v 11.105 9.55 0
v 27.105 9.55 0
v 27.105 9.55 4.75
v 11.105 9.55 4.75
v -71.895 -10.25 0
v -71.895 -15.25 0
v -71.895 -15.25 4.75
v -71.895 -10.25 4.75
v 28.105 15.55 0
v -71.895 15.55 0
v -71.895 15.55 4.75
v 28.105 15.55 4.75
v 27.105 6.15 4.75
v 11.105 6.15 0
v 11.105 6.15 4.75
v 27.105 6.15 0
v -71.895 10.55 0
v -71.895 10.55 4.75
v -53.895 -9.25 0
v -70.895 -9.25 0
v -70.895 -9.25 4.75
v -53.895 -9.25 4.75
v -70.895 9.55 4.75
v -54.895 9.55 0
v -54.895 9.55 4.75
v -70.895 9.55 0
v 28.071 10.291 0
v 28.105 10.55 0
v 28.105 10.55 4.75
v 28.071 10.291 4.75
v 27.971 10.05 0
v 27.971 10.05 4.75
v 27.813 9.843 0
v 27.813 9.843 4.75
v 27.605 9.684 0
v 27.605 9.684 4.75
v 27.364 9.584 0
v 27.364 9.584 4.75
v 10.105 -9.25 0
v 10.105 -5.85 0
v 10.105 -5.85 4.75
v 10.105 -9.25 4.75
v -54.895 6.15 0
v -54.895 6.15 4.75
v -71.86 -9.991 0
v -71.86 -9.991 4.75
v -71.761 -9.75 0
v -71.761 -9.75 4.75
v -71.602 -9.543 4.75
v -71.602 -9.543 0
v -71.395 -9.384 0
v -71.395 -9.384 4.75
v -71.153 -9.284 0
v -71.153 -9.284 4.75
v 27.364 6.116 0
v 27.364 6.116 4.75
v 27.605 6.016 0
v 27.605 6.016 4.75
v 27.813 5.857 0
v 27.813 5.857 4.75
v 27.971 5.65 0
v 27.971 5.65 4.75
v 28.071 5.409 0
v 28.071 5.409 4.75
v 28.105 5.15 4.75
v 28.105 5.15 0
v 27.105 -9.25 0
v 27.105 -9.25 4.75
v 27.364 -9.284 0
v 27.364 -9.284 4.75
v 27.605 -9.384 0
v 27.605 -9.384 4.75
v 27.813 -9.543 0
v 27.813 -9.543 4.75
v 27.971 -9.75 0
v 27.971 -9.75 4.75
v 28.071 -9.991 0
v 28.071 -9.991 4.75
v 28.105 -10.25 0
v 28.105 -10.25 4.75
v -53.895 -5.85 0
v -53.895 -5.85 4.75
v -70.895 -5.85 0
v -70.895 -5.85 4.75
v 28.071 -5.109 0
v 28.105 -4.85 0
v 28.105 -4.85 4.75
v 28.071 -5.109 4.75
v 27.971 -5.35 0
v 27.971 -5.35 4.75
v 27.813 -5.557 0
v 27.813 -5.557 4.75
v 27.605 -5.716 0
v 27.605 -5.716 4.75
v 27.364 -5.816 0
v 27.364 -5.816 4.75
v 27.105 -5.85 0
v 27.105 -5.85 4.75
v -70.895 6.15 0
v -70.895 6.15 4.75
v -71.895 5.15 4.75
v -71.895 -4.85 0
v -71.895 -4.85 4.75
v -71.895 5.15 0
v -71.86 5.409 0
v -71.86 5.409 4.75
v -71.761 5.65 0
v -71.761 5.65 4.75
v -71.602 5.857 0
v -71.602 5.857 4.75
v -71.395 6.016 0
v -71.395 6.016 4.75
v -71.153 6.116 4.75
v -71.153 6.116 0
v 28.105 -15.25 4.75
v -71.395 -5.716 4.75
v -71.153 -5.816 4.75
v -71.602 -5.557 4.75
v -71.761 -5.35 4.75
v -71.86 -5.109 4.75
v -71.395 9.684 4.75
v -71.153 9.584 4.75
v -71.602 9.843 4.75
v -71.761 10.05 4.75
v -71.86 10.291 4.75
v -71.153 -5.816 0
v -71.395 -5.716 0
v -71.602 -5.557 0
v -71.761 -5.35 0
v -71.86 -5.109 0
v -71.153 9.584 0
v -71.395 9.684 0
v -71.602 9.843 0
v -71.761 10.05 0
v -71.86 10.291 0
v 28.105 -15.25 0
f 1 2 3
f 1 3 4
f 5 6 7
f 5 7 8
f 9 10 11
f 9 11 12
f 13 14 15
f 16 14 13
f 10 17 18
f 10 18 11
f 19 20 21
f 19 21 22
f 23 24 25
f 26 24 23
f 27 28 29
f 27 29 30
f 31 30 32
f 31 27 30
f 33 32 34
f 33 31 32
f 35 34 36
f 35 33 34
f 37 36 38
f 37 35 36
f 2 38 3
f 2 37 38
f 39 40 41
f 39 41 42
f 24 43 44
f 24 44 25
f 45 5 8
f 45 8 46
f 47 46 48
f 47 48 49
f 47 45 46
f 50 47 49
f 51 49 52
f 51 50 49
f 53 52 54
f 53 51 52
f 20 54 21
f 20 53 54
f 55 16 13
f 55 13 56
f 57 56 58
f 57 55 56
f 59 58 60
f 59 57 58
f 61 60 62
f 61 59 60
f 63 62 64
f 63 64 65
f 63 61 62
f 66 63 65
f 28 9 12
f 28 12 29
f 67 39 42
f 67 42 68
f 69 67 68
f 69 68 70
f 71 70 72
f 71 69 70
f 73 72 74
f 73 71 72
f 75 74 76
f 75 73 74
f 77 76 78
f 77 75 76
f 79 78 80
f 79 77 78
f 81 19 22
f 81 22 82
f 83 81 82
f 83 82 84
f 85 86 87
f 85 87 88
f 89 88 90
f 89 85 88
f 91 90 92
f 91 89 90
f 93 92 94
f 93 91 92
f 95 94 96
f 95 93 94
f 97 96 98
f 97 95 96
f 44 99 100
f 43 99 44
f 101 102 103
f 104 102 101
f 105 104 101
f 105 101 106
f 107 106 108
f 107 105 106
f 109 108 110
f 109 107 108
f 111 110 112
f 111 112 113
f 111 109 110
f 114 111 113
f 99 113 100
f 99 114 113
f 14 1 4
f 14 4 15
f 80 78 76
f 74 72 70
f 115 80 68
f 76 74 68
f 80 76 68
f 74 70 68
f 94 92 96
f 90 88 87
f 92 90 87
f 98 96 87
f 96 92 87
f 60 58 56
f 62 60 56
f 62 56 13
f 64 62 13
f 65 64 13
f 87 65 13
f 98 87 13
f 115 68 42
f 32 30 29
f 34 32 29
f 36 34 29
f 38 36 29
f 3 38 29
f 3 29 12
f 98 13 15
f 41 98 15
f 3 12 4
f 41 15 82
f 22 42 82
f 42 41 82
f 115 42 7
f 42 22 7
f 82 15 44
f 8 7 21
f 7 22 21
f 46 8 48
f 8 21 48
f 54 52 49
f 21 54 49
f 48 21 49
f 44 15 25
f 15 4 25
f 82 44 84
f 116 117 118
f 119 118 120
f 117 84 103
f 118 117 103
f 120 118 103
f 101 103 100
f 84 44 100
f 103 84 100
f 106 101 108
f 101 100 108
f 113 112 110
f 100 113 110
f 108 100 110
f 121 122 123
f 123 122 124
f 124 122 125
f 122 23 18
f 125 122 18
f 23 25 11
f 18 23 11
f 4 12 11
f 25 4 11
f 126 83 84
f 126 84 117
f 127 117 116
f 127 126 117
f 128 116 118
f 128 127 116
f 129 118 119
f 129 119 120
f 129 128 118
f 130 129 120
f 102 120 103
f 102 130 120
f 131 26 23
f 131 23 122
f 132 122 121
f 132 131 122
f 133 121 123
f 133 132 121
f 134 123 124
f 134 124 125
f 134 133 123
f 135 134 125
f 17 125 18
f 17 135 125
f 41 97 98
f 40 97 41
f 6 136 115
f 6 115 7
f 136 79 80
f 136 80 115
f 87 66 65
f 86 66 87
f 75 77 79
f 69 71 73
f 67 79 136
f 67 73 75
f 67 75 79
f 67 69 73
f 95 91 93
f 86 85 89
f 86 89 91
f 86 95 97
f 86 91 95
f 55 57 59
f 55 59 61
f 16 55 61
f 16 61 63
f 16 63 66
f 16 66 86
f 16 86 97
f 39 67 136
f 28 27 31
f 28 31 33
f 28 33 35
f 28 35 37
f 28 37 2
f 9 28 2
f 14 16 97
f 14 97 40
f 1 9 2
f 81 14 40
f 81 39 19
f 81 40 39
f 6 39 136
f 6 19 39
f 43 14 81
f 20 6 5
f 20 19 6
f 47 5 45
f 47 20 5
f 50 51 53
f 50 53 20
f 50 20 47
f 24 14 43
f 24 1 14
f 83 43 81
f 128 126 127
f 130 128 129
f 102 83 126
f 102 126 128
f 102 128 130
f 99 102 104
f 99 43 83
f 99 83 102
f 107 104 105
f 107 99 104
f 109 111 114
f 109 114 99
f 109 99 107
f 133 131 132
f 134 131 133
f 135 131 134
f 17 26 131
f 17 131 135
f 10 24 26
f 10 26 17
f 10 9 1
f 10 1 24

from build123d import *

# Parameters (mm, degrees)
BOSS_EXTRUDE1_DEPTH = 4.75


with BuildPart() as part:
    # Sketch1 → Boss-Extrude1 (new body)
    with BuildSketch(Plane.XY):
        with BuildLine():
            Line((28.105438967, -10.25), (28.105438967, -15.25))
            Line((28.105438967, -15.25), (-71.894561033, -15.25))
            Line((-71.894561033, -15.25), (-71.894561033, -10.25))
            ThreePointArc((-71.894561033, -10.25), (-71.601667814, -9.542893219), (-70.894561033, -9.25))
            Line((-70.894561033, -9.25), (-53.894561033, -9.25))
            Line((-53.894561033, -9.25), (-53.894561033, -5.85))
            Line((-53.894561033, -5.85), (-70.894561033, -5.85))
            ThreePointArc((-70.894561033, -5.85), (-71.601667814, -5.557106781), (-71.894561033, -4.85))
            Line((-71.894561033, -4.85), (-71.894561033, 5.15))
            ThreePointArc((-71.894561033, 5.15), (-71.601667814, 5.857106781), (-70.894561033, 6.15))
            Line((-70.894561033, 6.15), (-54.894561033, 6.15))
            Line((-54.894561033, 6.15), (-54.894561033, 9.55))
            Line((-54.894561033, 9.55), (-70.894561033, 9.55))
            ThreePointArc((-70.894561033, 9.55), (-71.601667814, 9.842893219), (-71.894561033, 10.55))
            Line((-71.894561033, 10.55), (-71.894561033, 15.55))
            Line((-71.894561033, 15.55), (28.105438967, 15.55))
            Line((28.105438967, 15.55), (28.105438967, 10.55))
            ThreePointArc((28.105438967, 10.55), (27.812545748, 9.842893219), (27.105438967, 9.55))
            Line((27.105438967, 9.55), (11.105438967, 9.55))
            Line((11.105438967, 9.55), (11.105438967, 6.15))
            Line((11.105438967, 6.15), (27.105438967, 6.15))
            ThreePointArc((27.105438967, 6.15), (27.812545748, 5.857106781), (28.105438967, 5.15))
            Line((28.105438967, 5.15), (28.105438967, -4.85))
            ThreePointArc((28.105438967, -4.85), (27.812545748, -5.557106781), (27.105438967, -5.85))
            Line((27.105438967, -5.85), (10.105438967, -5.85))
            Line((10.105438967, -5.85), (10.105438967, -9.25))
            Line((10.105438967, -9.25), (27.105438967, -9.25))
            ThreePointArc((27.105438967, -9.25), (27.812545748, -9.542893219), (28.105438967, -10.25))
        make_face()
    extrude(amount=BOSS_EXTRUDE1_DEPTH)


solid = part.part
